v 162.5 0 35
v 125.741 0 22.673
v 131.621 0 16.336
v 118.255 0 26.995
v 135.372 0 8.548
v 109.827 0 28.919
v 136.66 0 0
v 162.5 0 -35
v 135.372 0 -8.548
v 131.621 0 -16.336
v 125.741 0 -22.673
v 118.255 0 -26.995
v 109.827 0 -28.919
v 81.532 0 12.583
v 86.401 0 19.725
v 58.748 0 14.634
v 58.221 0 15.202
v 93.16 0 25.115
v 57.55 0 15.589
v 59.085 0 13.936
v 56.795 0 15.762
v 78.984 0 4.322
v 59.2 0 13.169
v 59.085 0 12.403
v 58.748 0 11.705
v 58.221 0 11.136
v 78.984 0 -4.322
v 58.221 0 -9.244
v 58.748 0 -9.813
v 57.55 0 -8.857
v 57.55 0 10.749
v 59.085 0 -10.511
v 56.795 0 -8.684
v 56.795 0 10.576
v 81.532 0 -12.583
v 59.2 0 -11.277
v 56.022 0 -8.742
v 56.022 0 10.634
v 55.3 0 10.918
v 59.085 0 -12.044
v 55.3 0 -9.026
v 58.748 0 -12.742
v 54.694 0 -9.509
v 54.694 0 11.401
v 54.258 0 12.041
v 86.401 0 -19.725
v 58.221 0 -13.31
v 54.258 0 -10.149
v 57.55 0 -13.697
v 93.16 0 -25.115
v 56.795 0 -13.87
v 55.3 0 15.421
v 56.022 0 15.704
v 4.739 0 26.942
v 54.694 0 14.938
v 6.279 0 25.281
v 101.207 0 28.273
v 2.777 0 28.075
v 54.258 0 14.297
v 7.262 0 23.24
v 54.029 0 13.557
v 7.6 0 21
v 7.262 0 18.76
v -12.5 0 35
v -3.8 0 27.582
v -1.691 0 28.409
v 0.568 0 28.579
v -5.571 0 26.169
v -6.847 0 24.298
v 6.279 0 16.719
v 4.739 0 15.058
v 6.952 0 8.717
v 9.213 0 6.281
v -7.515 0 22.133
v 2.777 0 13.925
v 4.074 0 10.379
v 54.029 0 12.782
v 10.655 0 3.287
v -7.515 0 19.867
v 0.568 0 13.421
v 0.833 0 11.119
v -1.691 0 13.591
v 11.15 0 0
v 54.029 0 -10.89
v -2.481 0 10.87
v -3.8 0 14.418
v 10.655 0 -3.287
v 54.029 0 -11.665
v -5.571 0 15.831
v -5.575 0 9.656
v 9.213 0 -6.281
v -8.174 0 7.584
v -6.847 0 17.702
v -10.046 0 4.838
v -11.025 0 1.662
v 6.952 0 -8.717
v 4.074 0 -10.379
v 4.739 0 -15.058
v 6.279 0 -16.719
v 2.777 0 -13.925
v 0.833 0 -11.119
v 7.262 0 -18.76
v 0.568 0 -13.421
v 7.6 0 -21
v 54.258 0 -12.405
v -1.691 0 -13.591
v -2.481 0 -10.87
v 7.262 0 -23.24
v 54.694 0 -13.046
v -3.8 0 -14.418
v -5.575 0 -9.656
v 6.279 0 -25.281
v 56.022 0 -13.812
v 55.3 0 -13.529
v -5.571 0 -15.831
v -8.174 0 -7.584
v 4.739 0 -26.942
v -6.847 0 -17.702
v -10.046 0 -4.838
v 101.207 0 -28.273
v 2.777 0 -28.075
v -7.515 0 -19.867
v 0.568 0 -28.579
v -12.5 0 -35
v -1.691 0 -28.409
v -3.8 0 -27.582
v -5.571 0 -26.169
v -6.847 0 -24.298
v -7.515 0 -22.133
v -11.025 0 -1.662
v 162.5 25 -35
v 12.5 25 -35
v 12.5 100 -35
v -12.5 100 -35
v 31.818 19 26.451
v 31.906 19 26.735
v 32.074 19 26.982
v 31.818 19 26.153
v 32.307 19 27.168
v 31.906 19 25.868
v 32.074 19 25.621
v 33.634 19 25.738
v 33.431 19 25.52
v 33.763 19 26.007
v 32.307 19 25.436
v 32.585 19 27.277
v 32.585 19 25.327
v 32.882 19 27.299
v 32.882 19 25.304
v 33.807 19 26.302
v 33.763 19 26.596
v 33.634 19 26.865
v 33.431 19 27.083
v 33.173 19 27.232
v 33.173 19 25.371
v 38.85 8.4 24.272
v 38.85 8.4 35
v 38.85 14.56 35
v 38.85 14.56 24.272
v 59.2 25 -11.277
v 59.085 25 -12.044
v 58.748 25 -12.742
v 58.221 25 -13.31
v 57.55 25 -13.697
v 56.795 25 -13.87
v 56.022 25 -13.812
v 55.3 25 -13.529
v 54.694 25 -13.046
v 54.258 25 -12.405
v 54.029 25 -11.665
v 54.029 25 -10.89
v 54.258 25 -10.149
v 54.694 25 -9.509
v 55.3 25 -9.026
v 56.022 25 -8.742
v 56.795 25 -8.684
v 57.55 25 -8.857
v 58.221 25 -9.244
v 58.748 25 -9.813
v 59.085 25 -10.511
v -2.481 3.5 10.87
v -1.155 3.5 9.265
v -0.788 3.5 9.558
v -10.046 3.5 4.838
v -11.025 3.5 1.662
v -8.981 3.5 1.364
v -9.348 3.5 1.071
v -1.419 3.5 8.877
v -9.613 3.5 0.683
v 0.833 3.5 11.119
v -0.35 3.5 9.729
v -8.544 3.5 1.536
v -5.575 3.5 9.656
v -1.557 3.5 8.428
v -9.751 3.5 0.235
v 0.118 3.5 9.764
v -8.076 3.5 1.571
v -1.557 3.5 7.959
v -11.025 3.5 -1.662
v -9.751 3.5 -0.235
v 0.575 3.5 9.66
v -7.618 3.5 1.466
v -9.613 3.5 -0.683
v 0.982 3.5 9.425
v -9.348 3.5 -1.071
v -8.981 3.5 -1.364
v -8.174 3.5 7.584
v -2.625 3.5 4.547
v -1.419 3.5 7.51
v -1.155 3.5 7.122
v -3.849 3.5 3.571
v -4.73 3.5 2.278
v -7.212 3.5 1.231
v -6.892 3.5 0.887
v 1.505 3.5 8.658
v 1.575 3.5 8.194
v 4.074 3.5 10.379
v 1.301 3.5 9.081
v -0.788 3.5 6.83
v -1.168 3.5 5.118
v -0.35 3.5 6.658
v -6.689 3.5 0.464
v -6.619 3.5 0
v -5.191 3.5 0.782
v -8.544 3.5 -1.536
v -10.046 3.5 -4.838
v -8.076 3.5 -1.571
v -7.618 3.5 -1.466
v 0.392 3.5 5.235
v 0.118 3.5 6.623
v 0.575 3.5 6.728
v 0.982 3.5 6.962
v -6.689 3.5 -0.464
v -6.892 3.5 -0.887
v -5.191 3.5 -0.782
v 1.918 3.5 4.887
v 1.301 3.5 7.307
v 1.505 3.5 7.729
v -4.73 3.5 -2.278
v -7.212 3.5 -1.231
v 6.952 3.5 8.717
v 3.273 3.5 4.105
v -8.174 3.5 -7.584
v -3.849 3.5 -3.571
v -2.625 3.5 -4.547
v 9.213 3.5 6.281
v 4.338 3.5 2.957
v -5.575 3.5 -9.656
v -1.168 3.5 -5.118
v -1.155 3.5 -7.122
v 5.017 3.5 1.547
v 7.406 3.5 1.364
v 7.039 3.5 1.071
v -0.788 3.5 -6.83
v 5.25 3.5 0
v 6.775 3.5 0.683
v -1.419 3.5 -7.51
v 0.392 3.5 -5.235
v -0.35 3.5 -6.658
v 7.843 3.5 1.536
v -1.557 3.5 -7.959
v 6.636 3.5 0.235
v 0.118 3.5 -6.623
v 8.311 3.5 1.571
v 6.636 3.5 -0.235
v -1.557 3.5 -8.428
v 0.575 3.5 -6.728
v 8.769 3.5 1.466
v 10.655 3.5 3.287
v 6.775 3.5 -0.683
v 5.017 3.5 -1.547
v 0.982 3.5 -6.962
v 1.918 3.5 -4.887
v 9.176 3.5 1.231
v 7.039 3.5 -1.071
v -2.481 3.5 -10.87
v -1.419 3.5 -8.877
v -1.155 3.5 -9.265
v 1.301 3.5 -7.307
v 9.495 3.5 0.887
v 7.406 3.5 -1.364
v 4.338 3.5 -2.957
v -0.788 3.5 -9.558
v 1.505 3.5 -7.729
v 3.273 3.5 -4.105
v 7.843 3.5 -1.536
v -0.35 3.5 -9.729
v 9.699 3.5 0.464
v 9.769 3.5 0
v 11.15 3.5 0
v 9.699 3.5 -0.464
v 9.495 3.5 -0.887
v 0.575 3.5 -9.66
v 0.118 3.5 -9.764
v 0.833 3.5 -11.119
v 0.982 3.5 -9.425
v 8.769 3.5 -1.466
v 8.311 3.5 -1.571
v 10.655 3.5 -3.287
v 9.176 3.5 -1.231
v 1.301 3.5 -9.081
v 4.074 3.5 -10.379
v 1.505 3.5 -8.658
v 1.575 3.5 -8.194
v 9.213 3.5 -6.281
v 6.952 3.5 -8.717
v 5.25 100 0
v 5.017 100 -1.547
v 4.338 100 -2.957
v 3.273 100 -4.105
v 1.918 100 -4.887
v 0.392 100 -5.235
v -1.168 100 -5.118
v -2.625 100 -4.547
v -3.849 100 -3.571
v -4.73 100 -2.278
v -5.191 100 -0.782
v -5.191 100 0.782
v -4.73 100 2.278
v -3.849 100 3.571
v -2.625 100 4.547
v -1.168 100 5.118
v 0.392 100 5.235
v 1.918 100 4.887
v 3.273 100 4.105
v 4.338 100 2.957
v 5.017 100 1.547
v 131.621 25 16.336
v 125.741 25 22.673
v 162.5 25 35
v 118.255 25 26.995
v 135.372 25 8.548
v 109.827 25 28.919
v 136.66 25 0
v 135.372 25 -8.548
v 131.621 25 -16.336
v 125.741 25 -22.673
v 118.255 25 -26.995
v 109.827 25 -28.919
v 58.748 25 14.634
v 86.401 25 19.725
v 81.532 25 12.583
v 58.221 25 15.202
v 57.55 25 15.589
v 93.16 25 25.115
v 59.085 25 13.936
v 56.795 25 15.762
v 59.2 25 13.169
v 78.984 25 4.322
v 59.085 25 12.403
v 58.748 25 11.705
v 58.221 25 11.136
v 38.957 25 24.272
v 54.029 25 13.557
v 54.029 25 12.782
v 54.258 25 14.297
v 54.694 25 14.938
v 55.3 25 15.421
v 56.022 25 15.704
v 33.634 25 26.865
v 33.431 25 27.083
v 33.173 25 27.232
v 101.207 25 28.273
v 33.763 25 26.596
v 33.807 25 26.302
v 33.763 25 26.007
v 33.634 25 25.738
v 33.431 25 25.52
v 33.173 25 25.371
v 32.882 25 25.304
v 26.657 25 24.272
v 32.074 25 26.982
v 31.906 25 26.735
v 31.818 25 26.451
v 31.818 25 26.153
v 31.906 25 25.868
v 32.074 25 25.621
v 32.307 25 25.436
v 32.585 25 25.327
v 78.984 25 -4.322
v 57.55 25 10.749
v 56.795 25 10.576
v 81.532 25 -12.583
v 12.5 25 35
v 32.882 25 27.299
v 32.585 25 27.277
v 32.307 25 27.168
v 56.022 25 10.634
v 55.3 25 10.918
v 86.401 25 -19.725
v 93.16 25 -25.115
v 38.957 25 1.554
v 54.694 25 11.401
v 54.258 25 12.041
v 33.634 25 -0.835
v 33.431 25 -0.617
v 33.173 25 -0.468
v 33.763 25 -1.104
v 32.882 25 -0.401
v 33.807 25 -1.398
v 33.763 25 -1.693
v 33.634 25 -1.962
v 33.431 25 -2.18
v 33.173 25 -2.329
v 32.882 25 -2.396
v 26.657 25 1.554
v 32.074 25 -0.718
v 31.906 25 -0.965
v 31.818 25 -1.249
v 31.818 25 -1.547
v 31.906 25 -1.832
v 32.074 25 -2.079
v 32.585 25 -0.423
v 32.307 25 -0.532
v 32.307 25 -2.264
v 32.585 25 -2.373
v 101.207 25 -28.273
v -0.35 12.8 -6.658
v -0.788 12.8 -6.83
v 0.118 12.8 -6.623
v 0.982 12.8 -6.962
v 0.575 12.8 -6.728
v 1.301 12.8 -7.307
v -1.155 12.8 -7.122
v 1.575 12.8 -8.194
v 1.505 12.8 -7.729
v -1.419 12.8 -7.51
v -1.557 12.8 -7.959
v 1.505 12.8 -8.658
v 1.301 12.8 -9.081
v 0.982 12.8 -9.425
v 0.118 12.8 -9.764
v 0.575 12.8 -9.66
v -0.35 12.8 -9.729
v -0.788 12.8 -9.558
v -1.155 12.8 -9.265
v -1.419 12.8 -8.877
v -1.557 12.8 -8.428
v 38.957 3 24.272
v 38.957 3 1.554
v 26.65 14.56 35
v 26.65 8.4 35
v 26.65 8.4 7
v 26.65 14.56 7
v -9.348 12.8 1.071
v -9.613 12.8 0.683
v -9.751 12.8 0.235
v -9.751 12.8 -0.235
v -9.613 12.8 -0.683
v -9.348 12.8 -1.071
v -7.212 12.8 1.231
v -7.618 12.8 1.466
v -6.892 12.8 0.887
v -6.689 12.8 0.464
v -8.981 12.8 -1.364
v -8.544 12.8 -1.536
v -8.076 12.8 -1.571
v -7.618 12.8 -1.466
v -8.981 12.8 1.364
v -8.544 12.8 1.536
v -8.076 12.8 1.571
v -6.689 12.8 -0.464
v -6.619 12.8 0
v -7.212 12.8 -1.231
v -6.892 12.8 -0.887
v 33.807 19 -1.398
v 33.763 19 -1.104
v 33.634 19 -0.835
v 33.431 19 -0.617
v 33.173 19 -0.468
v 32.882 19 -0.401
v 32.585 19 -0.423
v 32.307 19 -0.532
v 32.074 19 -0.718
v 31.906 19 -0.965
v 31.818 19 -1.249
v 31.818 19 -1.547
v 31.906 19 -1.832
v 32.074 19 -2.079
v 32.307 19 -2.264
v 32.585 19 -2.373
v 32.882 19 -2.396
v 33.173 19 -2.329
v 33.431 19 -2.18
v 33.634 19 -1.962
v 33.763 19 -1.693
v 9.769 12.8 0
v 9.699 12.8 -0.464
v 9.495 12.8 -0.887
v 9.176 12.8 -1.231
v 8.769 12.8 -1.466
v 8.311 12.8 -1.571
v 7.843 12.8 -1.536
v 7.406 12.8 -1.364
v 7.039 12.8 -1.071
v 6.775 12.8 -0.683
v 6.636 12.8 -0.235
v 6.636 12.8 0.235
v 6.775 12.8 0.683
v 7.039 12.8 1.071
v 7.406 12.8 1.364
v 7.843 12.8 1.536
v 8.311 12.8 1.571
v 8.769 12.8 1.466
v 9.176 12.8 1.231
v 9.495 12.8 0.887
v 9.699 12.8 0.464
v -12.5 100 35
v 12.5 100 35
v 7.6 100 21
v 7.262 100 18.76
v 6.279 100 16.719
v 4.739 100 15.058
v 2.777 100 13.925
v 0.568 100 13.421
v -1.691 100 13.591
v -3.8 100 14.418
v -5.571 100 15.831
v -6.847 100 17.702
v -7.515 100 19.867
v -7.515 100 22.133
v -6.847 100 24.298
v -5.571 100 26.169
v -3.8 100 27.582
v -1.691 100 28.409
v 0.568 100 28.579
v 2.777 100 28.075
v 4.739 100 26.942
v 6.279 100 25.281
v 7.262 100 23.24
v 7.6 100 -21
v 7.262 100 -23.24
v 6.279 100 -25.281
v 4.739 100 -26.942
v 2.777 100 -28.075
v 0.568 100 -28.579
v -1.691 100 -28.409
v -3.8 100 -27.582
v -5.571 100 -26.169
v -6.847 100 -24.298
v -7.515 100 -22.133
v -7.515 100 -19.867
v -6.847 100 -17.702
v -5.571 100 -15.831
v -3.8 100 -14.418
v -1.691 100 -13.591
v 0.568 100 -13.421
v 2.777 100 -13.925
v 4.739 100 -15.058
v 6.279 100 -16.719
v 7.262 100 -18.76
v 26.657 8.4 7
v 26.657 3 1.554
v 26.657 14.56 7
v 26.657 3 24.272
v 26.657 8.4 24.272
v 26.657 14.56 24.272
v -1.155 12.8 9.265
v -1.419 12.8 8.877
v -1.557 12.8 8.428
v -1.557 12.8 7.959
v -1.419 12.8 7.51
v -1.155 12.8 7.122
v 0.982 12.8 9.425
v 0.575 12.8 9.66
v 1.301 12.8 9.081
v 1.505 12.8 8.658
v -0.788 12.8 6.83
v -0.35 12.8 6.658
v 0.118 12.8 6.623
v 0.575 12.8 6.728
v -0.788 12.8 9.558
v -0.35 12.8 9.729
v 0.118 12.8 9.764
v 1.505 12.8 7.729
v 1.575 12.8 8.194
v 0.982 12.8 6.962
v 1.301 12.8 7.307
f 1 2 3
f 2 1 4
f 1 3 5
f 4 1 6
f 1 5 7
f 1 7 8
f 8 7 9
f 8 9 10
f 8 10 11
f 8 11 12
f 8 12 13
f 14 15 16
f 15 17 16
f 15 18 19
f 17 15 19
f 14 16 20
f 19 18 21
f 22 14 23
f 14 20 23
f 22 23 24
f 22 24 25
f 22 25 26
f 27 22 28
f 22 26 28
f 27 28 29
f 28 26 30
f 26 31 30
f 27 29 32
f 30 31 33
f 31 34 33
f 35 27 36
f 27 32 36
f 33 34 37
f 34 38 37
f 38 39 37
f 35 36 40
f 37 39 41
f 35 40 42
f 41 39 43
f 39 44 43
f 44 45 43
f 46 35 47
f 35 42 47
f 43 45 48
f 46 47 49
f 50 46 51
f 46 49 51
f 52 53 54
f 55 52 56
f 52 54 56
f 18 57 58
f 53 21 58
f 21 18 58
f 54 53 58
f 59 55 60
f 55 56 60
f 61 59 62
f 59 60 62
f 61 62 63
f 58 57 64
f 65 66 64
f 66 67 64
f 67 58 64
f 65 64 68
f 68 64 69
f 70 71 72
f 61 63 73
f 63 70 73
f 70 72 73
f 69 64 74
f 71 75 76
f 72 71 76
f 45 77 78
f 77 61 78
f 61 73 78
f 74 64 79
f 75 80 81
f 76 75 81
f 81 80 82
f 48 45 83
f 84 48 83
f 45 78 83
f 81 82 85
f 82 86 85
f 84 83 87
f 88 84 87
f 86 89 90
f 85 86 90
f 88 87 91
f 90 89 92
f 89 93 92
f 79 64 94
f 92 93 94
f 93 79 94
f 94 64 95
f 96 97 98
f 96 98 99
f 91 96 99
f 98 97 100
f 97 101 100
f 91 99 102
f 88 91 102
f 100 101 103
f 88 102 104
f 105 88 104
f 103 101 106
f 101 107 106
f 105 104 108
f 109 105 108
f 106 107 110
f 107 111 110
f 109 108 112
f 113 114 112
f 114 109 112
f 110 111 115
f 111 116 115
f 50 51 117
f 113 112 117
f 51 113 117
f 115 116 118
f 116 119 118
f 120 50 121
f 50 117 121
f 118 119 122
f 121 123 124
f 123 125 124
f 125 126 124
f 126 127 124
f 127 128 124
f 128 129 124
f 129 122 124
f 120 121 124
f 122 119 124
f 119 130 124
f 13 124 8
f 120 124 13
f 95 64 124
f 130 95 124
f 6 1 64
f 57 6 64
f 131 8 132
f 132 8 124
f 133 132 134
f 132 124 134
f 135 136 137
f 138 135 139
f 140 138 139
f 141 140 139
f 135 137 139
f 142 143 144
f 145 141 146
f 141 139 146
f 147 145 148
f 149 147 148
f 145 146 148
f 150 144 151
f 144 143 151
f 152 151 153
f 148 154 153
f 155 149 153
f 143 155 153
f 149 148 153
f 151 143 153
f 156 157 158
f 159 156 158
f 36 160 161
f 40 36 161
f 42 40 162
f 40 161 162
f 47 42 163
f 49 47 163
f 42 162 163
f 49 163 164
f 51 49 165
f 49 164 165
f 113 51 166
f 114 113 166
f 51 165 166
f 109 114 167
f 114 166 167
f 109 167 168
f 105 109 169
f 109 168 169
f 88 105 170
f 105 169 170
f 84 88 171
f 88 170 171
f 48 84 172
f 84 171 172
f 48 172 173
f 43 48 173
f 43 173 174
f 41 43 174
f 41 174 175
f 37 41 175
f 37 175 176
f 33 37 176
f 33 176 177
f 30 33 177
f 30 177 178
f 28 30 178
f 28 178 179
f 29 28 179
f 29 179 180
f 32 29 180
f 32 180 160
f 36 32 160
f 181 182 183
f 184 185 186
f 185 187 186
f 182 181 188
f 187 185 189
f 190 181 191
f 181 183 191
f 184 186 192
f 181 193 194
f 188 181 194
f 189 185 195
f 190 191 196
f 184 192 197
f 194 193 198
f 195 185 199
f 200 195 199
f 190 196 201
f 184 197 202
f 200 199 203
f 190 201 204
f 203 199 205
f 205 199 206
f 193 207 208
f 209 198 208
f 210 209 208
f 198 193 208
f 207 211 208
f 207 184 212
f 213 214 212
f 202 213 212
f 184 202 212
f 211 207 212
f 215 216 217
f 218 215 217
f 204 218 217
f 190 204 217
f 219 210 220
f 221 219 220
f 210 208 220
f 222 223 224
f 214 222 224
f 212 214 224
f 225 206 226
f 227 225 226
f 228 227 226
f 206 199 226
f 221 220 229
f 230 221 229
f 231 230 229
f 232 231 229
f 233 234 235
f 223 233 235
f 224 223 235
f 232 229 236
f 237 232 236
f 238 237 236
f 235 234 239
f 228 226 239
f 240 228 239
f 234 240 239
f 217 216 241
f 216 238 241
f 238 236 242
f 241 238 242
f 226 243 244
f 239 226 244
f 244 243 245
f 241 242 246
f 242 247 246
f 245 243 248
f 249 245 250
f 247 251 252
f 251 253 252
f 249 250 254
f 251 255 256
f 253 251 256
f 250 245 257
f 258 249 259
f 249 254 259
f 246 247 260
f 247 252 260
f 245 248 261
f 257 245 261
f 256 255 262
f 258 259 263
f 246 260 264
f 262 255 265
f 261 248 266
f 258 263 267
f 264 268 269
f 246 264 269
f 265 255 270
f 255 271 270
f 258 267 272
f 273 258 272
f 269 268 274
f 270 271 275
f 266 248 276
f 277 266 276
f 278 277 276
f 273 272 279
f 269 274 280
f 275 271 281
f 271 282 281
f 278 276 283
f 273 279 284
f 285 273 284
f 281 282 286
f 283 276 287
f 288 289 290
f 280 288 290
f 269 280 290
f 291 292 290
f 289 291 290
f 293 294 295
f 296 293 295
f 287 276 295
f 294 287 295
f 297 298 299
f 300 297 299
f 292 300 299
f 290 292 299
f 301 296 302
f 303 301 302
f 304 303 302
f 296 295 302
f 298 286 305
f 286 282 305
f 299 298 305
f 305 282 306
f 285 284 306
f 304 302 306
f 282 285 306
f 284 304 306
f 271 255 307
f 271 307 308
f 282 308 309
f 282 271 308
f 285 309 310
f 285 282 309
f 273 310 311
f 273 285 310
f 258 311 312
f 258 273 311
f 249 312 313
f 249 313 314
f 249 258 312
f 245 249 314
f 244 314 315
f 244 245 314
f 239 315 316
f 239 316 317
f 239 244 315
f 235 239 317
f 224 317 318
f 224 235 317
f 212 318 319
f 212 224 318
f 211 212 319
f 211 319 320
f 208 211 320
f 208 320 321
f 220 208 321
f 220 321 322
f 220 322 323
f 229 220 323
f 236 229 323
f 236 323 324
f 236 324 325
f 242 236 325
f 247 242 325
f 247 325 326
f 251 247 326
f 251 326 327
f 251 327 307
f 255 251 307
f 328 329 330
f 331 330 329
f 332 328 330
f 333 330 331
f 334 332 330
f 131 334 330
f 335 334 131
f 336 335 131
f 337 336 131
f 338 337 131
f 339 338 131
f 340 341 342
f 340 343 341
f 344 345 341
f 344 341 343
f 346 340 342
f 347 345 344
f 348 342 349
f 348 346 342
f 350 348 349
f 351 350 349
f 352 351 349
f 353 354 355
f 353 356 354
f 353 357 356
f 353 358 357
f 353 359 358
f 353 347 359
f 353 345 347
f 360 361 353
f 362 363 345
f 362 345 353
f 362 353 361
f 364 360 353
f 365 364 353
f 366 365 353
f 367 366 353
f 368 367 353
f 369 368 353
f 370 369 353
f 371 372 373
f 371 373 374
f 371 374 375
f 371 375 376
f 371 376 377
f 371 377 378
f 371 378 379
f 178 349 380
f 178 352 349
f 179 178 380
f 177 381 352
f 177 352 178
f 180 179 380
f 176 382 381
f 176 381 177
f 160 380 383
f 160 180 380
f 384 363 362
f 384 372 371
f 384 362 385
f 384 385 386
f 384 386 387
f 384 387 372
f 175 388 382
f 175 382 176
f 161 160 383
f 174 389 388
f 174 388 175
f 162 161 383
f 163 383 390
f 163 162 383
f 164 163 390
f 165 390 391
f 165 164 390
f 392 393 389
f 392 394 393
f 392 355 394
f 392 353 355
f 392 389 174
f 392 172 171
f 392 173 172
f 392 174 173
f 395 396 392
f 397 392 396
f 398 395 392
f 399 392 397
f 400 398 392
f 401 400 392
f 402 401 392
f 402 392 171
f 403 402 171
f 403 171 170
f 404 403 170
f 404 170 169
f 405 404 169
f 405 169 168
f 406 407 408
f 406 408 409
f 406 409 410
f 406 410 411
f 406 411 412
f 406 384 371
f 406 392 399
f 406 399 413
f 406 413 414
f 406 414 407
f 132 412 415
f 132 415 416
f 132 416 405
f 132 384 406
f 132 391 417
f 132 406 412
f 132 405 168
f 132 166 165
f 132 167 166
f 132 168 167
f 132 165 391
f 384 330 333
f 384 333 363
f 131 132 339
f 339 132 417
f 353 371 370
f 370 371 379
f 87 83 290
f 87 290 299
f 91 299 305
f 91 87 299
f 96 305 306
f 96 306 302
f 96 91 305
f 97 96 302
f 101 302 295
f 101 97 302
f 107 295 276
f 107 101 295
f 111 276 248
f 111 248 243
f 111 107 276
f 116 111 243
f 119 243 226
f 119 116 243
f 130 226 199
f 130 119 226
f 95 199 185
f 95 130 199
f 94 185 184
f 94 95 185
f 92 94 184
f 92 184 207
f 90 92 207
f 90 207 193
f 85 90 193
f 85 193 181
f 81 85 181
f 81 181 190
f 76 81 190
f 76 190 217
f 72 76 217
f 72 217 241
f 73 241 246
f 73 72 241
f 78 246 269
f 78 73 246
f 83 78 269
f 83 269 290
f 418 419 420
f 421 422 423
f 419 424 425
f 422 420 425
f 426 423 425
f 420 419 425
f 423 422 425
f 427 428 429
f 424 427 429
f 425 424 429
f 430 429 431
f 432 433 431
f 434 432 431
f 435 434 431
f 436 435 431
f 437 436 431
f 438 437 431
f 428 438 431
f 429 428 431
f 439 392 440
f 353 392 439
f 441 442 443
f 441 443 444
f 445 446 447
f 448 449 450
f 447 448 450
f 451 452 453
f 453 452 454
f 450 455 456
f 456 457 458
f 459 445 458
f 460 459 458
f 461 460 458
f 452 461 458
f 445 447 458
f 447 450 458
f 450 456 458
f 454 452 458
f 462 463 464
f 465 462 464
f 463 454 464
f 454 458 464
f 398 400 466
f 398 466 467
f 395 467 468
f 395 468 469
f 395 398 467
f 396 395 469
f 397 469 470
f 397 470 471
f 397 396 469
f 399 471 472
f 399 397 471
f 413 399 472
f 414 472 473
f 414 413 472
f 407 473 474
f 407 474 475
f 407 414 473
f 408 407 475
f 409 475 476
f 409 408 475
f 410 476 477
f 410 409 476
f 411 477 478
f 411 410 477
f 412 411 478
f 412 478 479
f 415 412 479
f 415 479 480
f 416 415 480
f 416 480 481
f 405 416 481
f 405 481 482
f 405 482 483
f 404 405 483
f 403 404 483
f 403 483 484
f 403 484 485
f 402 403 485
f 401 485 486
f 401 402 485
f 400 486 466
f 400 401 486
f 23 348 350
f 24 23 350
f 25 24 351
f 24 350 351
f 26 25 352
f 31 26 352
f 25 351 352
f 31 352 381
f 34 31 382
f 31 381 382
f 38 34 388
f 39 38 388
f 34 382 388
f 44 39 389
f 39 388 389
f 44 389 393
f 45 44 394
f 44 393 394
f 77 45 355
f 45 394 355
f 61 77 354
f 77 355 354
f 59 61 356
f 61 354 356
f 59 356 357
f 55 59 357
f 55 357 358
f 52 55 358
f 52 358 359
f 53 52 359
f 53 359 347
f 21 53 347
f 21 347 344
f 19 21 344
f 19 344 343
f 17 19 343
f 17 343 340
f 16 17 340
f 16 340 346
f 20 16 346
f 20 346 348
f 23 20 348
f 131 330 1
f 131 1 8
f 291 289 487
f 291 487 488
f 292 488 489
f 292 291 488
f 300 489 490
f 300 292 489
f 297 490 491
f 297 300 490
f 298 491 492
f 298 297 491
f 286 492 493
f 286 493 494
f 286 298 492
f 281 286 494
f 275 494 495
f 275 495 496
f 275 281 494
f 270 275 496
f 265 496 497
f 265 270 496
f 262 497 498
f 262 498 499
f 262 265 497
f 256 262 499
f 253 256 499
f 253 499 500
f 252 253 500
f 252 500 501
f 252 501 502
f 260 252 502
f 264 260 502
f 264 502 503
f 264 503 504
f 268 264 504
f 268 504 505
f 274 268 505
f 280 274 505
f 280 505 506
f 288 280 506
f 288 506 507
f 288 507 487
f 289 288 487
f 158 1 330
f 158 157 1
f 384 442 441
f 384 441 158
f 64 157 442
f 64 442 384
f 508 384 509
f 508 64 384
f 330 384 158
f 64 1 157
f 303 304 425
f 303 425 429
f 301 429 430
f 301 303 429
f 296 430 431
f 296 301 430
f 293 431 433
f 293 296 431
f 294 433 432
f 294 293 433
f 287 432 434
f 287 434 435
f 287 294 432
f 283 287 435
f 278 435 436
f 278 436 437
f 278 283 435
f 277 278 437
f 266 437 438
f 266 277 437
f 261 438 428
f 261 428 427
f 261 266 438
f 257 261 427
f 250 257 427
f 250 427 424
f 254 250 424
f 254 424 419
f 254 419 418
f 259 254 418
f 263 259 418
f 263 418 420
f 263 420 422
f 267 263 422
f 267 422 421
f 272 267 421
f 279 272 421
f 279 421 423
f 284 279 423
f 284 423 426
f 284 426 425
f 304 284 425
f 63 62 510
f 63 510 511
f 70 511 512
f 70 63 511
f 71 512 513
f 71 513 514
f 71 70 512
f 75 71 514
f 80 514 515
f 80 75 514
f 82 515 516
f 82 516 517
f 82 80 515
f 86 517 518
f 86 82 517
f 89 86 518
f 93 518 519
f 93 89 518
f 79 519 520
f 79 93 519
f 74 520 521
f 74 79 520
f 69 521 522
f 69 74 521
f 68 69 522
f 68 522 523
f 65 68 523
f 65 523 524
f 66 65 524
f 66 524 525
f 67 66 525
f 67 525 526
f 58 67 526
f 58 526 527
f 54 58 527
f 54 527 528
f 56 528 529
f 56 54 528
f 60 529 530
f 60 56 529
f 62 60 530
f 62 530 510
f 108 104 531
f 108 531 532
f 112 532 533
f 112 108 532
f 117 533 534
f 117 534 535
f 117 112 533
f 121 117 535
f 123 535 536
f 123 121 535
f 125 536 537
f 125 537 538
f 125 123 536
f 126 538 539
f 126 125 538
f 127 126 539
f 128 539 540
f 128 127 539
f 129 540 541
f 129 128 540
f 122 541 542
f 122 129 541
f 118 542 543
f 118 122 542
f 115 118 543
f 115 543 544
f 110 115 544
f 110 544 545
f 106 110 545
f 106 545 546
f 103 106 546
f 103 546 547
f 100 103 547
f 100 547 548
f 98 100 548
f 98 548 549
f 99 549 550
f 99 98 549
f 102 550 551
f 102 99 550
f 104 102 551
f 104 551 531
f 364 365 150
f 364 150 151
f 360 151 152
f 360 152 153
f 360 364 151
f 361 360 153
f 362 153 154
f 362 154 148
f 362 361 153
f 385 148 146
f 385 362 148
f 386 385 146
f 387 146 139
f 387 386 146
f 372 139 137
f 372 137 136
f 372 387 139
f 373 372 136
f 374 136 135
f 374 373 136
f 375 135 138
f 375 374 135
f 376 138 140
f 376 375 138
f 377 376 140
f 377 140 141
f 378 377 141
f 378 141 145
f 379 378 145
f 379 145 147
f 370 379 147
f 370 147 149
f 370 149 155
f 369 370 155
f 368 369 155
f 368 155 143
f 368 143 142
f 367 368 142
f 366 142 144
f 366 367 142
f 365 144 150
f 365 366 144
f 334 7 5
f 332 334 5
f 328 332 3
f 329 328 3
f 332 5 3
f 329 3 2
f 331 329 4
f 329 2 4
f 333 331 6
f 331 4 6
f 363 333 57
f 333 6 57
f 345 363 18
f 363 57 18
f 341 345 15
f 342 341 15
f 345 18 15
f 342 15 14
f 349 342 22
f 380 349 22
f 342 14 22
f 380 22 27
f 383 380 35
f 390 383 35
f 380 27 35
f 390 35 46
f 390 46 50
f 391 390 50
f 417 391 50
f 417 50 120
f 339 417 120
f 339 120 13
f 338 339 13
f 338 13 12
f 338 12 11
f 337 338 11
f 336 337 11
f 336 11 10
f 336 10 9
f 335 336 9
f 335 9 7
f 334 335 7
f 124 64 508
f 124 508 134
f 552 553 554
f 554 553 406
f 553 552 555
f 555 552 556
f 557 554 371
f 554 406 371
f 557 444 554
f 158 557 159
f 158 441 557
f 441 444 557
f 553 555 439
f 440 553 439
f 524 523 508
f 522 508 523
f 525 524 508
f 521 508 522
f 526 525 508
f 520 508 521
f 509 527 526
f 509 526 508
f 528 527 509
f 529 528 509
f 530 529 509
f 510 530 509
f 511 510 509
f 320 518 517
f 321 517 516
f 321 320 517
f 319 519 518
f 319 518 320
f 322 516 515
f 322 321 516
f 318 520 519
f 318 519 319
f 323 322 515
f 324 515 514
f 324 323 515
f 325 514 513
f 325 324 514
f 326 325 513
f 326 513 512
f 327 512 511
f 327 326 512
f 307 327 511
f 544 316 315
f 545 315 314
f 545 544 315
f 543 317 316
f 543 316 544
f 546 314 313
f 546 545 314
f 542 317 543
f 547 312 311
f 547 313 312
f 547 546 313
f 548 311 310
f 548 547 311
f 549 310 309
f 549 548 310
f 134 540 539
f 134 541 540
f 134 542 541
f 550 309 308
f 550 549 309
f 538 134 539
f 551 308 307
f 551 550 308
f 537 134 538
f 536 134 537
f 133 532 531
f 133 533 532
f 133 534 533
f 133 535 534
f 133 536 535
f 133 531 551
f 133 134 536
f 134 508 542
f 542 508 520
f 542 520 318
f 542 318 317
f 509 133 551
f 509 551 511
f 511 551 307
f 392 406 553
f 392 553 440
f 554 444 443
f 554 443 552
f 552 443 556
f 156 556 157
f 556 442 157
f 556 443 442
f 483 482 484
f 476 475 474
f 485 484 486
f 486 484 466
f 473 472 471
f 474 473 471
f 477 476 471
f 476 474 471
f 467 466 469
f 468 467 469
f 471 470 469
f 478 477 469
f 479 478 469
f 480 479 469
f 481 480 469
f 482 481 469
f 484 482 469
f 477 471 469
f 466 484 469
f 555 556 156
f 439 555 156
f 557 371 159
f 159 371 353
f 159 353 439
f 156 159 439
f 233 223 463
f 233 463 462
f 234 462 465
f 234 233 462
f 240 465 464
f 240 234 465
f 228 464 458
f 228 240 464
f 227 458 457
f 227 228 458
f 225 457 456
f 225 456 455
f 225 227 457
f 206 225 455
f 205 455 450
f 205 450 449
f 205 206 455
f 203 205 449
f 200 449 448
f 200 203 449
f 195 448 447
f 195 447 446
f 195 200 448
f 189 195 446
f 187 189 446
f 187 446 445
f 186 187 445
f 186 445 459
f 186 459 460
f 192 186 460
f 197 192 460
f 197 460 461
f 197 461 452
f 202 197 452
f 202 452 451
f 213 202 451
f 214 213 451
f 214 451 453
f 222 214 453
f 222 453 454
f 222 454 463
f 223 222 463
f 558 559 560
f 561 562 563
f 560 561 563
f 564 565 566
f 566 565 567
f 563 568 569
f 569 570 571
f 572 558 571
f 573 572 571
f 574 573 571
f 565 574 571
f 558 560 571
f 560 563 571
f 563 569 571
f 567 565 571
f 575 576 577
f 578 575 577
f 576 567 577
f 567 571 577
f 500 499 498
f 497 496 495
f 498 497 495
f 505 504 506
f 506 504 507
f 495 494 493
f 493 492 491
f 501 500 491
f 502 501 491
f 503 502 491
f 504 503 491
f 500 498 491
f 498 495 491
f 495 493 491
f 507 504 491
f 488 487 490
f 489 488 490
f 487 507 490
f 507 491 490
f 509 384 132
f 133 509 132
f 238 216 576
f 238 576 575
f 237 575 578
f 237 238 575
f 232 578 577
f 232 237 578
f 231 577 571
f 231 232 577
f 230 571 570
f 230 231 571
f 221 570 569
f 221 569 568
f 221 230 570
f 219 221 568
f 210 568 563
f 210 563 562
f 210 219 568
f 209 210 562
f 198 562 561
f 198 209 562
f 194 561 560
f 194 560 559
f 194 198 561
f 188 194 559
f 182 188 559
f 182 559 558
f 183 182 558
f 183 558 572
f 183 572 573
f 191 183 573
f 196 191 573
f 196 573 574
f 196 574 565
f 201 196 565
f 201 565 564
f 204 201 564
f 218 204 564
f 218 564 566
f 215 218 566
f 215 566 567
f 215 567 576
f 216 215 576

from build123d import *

# Parameters (mm, degrees)
SKETCH1_W               = 25
SKETCH1_H               = 70
SKETCH1_R               = 7.6
SKETCH1_R_2             = 5.25
BOSS_EXTRUDE2_DEPTH     = 100
SKETCH1_12_R            = 1.575
CUT_EXTRUDE5_DEPTH      = 12.8
SKETCH1_27_R            = 11.15
CORTAR_EXTRUIR1_DEPTH   = 3.5
CROQUIS1_W              = 70
CROQUIS1_H              = 25
SALIENTE_EXTRUIR1_DEPTH = 150
CROQUIS4_R              = 29
CORTAR_EXTRUIR2_DEPTH   = 30
CUT_EXTRUDE6_START      = -25
CROQUIS4_3_W            = 12.3
CROQUIS4_3_H            = 22.718001441
CUT_EXTRUDE6_DEPTH      = 22
CUT_EXTRUDE7_START      = -25
CROQUIS4_4_R            = 1
CUT_EXTRUDE7_DEPTH      = 6
SKETCH2_W               = 12.2
SKETCH2_H               = 6.16
CUT_EXTRUDE11_DEPTH     = 28
CROQUIS5_R              = 2.6
CORTAR_EXTRUIR3_DEPTH   = 50


with BuildPart() as part:
    # Sketch1 → Boss-Extrude2 (new body)
    with BuildSketch(Plane(origin=(0, 0, 0), x_dir=(1, 0, 0), z_dir=(0, 1, 0))):
        Rectangle(SKETCH1_W, SKETCH1_H)
        with Locations((0, 21)):
            Circle(SKETCH1_R, mode=Mode.SUBTRACT)
        with Locations((0, -21)):
            Circle(SKETCH1_R, mode=Mode.SUBTRACT)
        Circle(SKETCH1_R_2, mode=Mode.SUBTRACT)
    extrude(amount=BOSS_EXTRUDE2_DEPTH)

    # Sketch1<12> → Cut-Extrude5 (cut)
    with BuildSketch(Plane(origin=(0, 0, 0), x_dir=(1, 0, 0), z_dir=(0, 1, 0))):
        with Locations((0, 8.193732966)):
            Circle(SKETCH1_12_R)
        with Locations((8.193732966, 0)):
            Circle(SKETCH1_12_R)
        with Locations((0, -8.193732966)):
            Circle(SKETCH1_12_R)
        with Locations((-8.193732966, 0)):
            Circle(SKETCH1_12_R)
    extrude(amount=CUT_EXTRUDE5_DEPTH, mode=Mode.SUBTRACT)

    # Sketch1<27> → Cortar-Extruir1 (cut)
    with BuildSketch(Plane(origin=(0, 0, 0), x_dir=(1, 0, 0), z_dir=(0, 1, 0))):
        Circle(SKETCH1_27_R)
    extrude(amount=CORTAR_EXTRUIR1_DEPTH, mode=Mode.SUBTRACT)

    # Croquis1 → Saliente-Extruir1 (add)
    with BuildSketch(Plane(origin=(12.5, 0, 0), x_dir=(0, 0, -1), z_dir=(1, 0, 0))):
        with Locations((0, 12.5)):
            Rectangle(CROQUIS1_W, CROQUIS1_H)
    extrude(amount=SALIENTE_EXTRUIR1_DEPTH)

    # Croquis4 → Cortar-Extruir2 (cut)
    with BuildSketch(Plane.XZ):
        with Locations((107.66, 0)):
            Circle(CROQUIS4_R)
    extrude(amount=-CORTAR_EXTRUIR2_DEPTH, mode=Mode.SUBTRACT)

    # Croquis4<3> → Cut-Extrude6 (cut)
    with BuildSketch(Plane.XZ.offset(CUT_EXTRUDE6_START)):
        with Locations((32.807294184, 12.912589049)):
            Rectangle(CROQUIS4_3_W, CROQUIS4_3_H)
    extrude(amount=CUT_EXTRUDE6_DEPTH, mode=Mode.SUBTRACT)

    # Croquis4<4> → Cut-Extrude7 (cut)
    with BuildSketch(Plane.XZ.offset(CUT_EXTRUDE7_START)):
        with Locations((32.807294184, -1.398410231)):
            Circle(CROQUIS4_4_R)
        with Locations((32.807294184, 26.301614952)):
            Circle(CROQUIS4_4_R)
    extrude(amount=CUT_EXTRUDE7_DEPTH, mode=Mode.SUBTRACT)

    # Sketch2 → Cut-Extrude11 (cut)
    with BuildSketch(Plane.XY.offset(35)):
        with Locations((32.75, 11.48)):
            Rectangle(SKETCH2_W, SKETCH2_H)
    extrude(amount=-CUT_EXTRUDE11_DEPTH, mode=Mode.SUBTRACT)

    # Croquis5 → Cortar-Extruir3 (cut)
    with BuildSketch(Plane(origin=(0, 25, 0), x_dir=(1, 0, 0), z_dir=(0, 1, 0))):
        with Locations((56.60021437, -13.16922633)):
            Circle(CROQUIS5_R)
        with Locations((56.60021437, 11.27722458)):
            Circle(CROQUIS5_R)
    extrude(amount=-CORTAR_EXTRUIR3_DEPTH, mode=Mode.SUBTRACT)


solid = part.part
